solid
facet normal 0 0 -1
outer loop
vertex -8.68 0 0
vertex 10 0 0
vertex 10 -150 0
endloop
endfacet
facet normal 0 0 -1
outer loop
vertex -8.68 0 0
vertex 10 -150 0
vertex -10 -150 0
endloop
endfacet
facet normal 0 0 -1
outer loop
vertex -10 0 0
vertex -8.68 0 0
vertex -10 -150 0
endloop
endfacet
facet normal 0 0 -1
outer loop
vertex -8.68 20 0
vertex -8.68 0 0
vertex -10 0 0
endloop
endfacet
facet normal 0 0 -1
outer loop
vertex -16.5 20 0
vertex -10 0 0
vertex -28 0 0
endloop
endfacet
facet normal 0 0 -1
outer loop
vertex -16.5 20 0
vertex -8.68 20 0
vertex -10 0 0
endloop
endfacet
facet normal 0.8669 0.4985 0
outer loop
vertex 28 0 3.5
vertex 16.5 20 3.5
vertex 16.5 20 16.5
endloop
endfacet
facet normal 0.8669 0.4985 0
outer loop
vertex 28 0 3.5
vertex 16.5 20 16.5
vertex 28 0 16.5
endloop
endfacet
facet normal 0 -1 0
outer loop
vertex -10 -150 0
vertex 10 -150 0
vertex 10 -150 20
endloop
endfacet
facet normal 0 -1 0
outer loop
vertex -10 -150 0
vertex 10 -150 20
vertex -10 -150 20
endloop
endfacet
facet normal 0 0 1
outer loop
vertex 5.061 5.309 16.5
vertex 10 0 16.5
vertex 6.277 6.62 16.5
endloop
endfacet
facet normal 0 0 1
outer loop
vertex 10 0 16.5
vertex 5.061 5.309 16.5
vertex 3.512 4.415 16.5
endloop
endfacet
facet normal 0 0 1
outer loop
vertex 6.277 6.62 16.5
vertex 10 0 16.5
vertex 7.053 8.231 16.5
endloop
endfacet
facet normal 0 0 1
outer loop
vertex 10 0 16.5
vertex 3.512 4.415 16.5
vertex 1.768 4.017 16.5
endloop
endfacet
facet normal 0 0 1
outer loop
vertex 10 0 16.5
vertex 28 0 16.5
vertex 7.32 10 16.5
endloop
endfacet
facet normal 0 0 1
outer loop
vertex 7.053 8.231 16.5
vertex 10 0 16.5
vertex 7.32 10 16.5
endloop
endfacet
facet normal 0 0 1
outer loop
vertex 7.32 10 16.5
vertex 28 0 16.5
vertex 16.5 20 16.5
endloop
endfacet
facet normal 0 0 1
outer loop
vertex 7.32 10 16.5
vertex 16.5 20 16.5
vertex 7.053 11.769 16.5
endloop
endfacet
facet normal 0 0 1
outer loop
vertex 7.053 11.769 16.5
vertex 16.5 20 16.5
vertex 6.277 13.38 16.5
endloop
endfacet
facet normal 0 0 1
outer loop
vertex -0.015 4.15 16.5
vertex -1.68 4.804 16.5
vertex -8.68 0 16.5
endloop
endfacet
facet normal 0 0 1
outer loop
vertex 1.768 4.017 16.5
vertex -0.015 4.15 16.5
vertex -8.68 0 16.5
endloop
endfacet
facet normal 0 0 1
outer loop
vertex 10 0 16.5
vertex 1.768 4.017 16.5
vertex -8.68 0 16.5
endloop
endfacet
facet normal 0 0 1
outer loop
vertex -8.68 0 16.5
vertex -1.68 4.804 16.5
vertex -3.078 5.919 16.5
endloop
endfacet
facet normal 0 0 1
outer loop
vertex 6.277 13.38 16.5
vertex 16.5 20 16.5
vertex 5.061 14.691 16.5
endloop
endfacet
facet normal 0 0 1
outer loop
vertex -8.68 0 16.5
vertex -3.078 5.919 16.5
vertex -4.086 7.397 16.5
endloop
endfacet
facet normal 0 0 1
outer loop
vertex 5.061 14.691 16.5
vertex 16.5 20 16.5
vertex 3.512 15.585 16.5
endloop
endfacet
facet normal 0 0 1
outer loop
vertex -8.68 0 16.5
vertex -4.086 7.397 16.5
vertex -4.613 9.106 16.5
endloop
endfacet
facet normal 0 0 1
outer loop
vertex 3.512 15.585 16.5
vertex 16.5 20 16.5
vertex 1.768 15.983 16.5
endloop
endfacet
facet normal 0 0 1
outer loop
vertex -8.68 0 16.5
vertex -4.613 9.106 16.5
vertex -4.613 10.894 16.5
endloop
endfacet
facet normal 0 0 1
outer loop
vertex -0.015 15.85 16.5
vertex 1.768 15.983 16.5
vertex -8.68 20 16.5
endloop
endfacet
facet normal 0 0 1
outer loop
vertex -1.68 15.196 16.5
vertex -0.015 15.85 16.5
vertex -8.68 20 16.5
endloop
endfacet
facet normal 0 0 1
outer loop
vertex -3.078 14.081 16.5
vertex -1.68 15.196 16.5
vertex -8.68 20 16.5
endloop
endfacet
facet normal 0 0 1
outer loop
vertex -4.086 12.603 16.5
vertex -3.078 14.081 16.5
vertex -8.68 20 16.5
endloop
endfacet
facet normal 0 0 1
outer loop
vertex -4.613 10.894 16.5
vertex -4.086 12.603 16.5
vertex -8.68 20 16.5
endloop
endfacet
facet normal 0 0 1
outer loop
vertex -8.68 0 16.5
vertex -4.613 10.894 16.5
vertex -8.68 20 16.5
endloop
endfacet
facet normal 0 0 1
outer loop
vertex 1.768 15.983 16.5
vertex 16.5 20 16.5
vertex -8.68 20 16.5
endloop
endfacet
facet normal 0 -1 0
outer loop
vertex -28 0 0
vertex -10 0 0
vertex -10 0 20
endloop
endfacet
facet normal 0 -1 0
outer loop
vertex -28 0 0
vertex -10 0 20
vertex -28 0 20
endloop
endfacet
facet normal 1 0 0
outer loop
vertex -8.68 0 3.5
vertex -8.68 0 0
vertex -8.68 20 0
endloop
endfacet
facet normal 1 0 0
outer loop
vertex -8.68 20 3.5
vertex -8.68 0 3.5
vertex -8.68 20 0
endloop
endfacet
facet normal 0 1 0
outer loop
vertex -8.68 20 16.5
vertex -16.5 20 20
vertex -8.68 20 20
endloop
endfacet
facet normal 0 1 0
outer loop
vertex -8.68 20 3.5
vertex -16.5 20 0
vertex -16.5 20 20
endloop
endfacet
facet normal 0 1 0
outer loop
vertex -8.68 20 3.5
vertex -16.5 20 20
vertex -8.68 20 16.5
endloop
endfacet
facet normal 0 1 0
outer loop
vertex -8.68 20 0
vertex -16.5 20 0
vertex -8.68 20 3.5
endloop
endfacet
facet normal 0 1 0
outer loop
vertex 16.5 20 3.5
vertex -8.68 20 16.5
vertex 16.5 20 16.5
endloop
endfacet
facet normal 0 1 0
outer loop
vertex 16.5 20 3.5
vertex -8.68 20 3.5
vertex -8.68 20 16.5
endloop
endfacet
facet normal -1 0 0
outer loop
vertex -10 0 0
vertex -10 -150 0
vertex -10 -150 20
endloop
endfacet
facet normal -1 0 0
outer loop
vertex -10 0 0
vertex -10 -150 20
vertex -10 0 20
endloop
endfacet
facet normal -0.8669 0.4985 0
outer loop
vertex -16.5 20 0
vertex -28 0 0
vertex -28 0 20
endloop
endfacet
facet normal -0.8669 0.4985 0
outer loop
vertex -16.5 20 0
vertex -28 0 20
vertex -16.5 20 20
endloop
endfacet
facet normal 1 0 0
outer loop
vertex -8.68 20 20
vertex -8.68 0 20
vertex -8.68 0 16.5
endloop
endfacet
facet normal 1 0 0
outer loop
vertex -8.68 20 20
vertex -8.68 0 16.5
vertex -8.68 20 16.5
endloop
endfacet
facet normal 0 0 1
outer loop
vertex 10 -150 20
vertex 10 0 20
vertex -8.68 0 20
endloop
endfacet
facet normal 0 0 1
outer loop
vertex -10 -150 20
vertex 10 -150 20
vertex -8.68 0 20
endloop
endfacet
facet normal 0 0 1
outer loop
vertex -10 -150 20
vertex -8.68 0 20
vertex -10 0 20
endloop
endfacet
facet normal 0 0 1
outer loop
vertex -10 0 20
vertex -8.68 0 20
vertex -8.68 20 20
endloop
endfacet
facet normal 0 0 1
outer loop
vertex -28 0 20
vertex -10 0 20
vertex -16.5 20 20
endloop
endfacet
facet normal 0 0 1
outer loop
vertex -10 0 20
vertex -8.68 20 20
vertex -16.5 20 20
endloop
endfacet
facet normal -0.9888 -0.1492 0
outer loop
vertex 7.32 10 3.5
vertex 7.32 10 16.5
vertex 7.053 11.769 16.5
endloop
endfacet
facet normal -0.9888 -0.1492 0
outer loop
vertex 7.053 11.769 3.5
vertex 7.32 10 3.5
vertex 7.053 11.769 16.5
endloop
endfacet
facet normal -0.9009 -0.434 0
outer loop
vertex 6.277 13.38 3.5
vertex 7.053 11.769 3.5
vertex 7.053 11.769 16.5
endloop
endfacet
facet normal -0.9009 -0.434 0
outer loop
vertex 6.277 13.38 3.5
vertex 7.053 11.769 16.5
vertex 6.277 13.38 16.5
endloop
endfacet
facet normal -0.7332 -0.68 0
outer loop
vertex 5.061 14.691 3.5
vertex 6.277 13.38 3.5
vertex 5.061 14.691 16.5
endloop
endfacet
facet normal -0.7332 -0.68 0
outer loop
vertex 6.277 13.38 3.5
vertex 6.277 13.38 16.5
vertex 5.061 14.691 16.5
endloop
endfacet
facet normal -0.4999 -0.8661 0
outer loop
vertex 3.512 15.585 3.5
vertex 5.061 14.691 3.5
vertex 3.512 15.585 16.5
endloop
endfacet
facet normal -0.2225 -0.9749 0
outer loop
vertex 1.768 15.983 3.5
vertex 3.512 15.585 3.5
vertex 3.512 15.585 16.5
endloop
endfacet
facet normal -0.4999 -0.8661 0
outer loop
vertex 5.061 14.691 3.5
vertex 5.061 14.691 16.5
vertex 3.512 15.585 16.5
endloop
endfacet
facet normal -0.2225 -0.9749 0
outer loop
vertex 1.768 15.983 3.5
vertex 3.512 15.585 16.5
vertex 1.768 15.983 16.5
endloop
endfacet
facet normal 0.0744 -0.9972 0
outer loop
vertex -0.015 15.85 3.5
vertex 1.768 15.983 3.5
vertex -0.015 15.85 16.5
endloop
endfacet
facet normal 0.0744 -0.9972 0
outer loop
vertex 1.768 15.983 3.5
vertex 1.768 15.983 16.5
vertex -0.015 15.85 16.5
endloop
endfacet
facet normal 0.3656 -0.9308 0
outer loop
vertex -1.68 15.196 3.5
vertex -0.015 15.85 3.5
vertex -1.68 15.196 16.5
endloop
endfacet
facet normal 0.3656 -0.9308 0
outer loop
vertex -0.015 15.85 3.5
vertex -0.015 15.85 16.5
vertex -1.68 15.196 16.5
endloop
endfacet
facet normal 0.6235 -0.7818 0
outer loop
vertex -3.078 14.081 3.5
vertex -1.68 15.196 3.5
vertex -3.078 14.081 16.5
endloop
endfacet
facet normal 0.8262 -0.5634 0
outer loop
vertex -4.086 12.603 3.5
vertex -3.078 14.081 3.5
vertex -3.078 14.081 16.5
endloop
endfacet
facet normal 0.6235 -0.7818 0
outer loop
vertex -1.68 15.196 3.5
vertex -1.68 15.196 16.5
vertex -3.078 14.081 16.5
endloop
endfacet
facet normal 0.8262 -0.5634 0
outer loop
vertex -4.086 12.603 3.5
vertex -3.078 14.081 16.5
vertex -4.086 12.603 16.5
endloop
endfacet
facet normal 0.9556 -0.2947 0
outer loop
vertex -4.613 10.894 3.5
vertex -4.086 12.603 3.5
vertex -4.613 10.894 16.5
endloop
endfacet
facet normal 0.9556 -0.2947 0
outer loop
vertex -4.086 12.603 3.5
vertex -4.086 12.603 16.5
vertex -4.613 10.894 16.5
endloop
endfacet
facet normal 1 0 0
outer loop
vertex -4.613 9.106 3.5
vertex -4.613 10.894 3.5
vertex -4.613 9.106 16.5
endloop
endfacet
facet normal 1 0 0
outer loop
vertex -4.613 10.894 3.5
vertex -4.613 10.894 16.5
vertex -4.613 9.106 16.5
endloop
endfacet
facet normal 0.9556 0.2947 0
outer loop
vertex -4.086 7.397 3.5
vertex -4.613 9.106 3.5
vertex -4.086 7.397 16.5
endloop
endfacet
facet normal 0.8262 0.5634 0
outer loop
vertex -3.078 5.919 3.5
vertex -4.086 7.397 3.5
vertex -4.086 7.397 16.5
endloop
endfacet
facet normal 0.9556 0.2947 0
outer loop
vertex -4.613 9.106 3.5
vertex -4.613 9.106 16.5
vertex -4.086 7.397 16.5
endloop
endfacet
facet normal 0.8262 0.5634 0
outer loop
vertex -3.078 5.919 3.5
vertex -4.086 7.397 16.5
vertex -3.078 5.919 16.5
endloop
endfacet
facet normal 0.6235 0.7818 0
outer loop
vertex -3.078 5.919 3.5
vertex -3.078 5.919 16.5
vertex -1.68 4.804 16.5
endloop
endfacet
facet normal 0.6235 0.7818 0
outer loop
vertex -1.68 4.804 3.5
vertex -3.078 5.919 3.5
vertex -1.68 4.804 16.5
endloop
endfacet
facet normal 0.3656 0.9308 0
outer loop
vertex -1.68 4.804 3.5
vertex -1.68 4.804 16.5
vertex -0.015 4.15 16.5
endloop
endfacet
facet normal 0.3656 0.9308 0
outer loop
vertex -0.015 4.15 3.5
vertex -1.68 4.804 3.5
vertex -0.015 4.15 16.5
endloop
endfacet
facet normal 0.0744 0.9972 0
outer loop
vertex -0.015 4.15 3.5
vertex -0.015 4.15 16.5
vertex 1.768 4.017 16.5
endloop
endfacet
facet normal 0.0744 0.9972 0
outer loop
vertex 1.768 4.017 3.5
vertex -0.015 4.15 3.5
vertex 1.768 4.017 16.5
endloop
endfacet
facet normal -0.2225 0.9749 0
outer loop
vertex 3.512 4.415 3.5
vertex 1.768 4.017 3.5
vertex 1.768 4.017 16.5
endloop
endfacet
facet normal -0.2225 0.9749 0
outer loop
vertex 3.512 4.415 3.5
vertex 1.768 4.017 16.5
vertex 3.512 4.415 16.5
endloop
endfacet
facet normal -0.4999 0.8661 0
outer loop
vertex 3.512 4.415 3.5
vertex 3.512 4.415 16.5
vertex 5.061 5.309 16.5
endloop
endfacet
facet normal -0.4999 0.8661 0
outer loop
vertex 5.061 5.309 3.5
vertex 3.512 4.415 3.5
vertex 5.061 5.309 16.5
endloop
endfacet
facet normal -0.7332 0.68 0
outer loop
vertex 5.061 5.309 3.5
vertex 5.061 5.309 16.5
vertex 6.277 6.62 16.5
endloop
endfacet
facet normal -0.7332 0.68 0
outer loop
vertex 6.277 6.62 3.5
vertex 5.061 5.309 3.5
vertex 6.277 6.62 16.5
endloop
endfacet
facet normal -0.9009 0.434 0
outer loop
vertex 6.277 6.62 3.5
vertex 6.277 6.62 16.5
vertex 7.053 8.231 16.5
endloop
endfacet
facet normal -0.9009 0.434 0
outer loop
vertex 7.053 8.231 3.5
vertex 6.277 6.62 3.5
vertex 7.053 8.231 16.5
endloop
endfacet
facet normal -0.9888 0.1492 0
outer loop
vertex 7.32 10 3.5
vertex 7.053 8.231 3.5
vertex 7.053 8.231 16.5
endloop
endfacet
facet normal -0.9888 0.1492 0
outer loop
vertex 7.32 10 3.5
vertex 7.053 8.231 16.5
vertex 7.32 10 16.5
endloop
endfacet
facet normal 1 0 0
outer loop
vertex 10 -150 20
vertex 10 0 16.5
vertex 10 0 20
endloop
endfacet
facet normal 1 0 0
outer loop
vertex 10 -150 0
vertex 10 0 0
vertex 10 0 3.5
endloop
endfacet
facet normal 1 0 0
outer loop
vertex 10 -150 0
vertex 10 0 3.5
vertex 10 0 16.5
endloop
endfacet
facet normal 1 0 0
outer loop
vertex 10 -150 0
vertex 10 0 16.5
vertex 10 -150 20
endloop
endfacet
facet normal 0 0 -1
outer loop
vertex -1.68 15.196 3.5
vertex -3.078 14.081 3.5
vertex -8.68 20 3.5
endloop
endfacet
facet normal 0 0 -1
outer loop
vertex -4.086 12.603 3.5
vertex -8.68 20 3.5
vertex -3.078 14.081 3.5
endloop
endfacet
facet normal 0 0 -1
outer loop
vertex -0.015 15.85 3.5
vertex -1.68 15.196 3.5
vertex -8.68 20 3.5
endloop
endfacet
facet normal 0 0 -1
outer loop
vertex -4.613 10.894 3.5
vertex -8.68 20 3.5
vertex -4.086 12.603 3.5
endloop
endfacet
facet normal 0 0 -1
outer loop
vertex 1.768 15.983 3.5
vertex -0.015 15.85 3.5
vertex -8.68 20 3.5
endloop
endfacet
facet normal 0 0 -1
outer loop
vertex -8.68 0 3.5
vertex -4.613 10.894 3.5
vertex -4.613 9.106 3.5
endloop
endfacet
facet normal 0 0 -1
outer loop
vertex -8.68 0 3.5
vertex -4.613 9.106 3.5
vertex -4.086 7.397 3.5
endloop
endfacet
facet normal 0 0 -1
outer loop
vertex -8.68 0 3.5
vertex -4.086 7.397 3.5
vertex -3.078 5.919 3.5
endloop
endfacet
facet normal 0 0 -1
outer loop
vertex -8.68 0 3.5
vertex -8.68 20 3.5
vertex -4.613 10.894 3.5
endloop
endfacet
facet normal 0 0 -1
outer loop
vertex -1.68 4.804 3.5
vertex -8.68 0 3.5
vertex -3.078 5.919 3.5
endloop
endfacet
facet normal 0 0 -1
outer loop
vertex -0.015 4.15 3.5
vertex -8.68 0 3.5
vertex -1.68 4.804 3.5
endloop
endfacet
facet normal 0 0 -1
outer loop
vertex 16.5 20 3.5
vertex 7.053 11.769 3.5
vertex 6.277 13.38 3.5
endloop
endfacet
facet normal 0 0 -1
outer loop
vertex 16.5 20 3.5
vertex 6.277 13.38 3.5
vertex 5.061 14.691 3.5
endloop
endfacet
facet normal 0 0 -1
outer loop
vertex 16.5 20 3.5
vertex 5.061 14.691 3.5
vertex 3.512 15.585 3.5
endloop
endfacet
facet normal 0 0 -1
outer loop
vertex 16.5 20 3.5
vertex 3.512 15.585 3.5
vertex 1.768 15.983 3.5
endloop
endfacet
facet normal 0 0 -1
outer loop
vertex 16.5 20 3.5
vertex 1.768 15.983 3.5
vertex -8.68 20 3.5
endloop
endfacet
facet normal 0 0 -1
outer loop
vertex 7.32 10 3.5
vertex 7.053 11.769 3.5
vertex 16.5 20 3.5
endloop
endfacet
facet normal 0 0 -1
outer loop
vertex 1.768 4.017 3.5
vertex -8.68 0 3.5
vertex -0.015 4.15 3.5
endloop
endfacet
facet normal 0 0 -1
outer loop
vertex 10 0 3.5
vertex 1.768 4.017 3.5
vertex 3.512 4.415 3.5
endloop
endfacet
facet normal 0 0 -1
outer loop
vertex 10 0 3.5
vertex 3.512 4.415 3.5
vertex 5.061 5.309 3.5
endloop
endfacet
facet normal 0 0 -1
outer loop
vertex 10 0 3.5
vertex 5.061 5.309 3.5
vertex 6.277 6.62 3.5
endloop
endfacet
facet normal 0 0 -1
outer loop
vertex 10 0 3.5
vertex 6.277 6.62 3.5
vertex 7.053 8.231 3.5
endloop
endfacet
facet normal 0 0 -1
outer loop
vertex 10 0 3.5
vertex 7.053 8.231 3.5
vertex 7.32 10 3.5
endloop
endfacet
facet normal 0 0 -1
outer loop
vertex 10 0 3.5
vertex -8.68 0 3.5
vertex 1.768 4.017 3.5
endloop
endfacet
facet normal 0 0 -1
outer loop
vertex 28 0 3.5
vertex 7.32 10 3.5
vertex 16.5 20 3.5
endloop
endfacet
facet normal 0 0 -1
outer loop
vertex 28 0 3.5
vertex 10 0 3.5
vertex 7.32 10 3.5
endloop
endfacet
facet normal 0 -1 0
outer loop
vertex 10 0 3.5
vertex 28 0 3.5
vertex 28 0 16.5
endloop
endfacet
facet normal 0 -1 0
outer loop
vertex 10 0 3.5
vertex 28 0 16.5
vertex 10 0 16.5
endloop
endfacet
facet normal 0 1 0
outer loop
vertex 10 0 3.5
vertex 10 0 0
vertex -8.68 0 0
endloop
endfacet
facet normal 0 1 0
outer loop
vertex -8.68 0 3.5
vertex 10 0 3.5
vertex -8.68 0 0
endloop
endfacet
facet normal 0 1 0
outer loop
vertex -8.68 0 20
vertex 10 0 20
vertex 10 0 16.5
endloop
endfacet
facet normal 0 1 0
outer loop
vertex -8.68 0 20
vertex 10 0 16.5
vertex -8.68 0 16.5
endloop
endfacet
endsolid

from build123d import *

# Parameters (mm, degrees)
PAD_DEPTH       = 20
POCKET_DEPTH    = 3.5
POCKET001_DEPTH = 3.5
SKETCH004_R     = 6
POCKET002_DEPTH = 16.501


with BuildPart() as part:
    # Sketch001 → Pad (new body)
    with BuildSketch(Plane.XY):
        Polygon((-16.5, 20), (16.5, 20), (28, 0), (10, 0), (10, -150), (-10, -150), (-10, 0), (-28, 0), align=None)
    extrude(amount=PAD_DEPTH)

    # Sketch002 (on Face10 of Pad) → Pocket (cut)
    with BuildSketch(Plane.XY.offset(20)):
        Polygon((28, 0), (-8.68, 0), (-8.68, 20), (16.5, 20), align=None)
    extrude(amount=-POCKET_DEPTH, mode=Mode.SUBTRACT)

    # Sketch003 (on Face2 of Pocket) → Pocket001 (cut)
    with BuildSketch(Plane(origin=(0, 0, 0), x_dir=(1, 0, 0), z_dir=(0, 0, -1))):
        Polygon((28, 0), (-8.68, 0), (-8.68, -20), (16.5, -20), align=None)
    extrude(amount=-POCKET001_DEPTH, mode=Mode.SUBTRACT)

    # Sketch004 (on Face6 of Pocket001) → Pocket002 (cut, through all)
    with BuildSketch(Plane.XY.offset(16.5)):
        with Locations((1.32, 10)):
            Circle(SKETCH004_R)
    extrude(amount=-POCKET002_DEPTH, mode=Mode.SUBTRACT)


solid = part.part
